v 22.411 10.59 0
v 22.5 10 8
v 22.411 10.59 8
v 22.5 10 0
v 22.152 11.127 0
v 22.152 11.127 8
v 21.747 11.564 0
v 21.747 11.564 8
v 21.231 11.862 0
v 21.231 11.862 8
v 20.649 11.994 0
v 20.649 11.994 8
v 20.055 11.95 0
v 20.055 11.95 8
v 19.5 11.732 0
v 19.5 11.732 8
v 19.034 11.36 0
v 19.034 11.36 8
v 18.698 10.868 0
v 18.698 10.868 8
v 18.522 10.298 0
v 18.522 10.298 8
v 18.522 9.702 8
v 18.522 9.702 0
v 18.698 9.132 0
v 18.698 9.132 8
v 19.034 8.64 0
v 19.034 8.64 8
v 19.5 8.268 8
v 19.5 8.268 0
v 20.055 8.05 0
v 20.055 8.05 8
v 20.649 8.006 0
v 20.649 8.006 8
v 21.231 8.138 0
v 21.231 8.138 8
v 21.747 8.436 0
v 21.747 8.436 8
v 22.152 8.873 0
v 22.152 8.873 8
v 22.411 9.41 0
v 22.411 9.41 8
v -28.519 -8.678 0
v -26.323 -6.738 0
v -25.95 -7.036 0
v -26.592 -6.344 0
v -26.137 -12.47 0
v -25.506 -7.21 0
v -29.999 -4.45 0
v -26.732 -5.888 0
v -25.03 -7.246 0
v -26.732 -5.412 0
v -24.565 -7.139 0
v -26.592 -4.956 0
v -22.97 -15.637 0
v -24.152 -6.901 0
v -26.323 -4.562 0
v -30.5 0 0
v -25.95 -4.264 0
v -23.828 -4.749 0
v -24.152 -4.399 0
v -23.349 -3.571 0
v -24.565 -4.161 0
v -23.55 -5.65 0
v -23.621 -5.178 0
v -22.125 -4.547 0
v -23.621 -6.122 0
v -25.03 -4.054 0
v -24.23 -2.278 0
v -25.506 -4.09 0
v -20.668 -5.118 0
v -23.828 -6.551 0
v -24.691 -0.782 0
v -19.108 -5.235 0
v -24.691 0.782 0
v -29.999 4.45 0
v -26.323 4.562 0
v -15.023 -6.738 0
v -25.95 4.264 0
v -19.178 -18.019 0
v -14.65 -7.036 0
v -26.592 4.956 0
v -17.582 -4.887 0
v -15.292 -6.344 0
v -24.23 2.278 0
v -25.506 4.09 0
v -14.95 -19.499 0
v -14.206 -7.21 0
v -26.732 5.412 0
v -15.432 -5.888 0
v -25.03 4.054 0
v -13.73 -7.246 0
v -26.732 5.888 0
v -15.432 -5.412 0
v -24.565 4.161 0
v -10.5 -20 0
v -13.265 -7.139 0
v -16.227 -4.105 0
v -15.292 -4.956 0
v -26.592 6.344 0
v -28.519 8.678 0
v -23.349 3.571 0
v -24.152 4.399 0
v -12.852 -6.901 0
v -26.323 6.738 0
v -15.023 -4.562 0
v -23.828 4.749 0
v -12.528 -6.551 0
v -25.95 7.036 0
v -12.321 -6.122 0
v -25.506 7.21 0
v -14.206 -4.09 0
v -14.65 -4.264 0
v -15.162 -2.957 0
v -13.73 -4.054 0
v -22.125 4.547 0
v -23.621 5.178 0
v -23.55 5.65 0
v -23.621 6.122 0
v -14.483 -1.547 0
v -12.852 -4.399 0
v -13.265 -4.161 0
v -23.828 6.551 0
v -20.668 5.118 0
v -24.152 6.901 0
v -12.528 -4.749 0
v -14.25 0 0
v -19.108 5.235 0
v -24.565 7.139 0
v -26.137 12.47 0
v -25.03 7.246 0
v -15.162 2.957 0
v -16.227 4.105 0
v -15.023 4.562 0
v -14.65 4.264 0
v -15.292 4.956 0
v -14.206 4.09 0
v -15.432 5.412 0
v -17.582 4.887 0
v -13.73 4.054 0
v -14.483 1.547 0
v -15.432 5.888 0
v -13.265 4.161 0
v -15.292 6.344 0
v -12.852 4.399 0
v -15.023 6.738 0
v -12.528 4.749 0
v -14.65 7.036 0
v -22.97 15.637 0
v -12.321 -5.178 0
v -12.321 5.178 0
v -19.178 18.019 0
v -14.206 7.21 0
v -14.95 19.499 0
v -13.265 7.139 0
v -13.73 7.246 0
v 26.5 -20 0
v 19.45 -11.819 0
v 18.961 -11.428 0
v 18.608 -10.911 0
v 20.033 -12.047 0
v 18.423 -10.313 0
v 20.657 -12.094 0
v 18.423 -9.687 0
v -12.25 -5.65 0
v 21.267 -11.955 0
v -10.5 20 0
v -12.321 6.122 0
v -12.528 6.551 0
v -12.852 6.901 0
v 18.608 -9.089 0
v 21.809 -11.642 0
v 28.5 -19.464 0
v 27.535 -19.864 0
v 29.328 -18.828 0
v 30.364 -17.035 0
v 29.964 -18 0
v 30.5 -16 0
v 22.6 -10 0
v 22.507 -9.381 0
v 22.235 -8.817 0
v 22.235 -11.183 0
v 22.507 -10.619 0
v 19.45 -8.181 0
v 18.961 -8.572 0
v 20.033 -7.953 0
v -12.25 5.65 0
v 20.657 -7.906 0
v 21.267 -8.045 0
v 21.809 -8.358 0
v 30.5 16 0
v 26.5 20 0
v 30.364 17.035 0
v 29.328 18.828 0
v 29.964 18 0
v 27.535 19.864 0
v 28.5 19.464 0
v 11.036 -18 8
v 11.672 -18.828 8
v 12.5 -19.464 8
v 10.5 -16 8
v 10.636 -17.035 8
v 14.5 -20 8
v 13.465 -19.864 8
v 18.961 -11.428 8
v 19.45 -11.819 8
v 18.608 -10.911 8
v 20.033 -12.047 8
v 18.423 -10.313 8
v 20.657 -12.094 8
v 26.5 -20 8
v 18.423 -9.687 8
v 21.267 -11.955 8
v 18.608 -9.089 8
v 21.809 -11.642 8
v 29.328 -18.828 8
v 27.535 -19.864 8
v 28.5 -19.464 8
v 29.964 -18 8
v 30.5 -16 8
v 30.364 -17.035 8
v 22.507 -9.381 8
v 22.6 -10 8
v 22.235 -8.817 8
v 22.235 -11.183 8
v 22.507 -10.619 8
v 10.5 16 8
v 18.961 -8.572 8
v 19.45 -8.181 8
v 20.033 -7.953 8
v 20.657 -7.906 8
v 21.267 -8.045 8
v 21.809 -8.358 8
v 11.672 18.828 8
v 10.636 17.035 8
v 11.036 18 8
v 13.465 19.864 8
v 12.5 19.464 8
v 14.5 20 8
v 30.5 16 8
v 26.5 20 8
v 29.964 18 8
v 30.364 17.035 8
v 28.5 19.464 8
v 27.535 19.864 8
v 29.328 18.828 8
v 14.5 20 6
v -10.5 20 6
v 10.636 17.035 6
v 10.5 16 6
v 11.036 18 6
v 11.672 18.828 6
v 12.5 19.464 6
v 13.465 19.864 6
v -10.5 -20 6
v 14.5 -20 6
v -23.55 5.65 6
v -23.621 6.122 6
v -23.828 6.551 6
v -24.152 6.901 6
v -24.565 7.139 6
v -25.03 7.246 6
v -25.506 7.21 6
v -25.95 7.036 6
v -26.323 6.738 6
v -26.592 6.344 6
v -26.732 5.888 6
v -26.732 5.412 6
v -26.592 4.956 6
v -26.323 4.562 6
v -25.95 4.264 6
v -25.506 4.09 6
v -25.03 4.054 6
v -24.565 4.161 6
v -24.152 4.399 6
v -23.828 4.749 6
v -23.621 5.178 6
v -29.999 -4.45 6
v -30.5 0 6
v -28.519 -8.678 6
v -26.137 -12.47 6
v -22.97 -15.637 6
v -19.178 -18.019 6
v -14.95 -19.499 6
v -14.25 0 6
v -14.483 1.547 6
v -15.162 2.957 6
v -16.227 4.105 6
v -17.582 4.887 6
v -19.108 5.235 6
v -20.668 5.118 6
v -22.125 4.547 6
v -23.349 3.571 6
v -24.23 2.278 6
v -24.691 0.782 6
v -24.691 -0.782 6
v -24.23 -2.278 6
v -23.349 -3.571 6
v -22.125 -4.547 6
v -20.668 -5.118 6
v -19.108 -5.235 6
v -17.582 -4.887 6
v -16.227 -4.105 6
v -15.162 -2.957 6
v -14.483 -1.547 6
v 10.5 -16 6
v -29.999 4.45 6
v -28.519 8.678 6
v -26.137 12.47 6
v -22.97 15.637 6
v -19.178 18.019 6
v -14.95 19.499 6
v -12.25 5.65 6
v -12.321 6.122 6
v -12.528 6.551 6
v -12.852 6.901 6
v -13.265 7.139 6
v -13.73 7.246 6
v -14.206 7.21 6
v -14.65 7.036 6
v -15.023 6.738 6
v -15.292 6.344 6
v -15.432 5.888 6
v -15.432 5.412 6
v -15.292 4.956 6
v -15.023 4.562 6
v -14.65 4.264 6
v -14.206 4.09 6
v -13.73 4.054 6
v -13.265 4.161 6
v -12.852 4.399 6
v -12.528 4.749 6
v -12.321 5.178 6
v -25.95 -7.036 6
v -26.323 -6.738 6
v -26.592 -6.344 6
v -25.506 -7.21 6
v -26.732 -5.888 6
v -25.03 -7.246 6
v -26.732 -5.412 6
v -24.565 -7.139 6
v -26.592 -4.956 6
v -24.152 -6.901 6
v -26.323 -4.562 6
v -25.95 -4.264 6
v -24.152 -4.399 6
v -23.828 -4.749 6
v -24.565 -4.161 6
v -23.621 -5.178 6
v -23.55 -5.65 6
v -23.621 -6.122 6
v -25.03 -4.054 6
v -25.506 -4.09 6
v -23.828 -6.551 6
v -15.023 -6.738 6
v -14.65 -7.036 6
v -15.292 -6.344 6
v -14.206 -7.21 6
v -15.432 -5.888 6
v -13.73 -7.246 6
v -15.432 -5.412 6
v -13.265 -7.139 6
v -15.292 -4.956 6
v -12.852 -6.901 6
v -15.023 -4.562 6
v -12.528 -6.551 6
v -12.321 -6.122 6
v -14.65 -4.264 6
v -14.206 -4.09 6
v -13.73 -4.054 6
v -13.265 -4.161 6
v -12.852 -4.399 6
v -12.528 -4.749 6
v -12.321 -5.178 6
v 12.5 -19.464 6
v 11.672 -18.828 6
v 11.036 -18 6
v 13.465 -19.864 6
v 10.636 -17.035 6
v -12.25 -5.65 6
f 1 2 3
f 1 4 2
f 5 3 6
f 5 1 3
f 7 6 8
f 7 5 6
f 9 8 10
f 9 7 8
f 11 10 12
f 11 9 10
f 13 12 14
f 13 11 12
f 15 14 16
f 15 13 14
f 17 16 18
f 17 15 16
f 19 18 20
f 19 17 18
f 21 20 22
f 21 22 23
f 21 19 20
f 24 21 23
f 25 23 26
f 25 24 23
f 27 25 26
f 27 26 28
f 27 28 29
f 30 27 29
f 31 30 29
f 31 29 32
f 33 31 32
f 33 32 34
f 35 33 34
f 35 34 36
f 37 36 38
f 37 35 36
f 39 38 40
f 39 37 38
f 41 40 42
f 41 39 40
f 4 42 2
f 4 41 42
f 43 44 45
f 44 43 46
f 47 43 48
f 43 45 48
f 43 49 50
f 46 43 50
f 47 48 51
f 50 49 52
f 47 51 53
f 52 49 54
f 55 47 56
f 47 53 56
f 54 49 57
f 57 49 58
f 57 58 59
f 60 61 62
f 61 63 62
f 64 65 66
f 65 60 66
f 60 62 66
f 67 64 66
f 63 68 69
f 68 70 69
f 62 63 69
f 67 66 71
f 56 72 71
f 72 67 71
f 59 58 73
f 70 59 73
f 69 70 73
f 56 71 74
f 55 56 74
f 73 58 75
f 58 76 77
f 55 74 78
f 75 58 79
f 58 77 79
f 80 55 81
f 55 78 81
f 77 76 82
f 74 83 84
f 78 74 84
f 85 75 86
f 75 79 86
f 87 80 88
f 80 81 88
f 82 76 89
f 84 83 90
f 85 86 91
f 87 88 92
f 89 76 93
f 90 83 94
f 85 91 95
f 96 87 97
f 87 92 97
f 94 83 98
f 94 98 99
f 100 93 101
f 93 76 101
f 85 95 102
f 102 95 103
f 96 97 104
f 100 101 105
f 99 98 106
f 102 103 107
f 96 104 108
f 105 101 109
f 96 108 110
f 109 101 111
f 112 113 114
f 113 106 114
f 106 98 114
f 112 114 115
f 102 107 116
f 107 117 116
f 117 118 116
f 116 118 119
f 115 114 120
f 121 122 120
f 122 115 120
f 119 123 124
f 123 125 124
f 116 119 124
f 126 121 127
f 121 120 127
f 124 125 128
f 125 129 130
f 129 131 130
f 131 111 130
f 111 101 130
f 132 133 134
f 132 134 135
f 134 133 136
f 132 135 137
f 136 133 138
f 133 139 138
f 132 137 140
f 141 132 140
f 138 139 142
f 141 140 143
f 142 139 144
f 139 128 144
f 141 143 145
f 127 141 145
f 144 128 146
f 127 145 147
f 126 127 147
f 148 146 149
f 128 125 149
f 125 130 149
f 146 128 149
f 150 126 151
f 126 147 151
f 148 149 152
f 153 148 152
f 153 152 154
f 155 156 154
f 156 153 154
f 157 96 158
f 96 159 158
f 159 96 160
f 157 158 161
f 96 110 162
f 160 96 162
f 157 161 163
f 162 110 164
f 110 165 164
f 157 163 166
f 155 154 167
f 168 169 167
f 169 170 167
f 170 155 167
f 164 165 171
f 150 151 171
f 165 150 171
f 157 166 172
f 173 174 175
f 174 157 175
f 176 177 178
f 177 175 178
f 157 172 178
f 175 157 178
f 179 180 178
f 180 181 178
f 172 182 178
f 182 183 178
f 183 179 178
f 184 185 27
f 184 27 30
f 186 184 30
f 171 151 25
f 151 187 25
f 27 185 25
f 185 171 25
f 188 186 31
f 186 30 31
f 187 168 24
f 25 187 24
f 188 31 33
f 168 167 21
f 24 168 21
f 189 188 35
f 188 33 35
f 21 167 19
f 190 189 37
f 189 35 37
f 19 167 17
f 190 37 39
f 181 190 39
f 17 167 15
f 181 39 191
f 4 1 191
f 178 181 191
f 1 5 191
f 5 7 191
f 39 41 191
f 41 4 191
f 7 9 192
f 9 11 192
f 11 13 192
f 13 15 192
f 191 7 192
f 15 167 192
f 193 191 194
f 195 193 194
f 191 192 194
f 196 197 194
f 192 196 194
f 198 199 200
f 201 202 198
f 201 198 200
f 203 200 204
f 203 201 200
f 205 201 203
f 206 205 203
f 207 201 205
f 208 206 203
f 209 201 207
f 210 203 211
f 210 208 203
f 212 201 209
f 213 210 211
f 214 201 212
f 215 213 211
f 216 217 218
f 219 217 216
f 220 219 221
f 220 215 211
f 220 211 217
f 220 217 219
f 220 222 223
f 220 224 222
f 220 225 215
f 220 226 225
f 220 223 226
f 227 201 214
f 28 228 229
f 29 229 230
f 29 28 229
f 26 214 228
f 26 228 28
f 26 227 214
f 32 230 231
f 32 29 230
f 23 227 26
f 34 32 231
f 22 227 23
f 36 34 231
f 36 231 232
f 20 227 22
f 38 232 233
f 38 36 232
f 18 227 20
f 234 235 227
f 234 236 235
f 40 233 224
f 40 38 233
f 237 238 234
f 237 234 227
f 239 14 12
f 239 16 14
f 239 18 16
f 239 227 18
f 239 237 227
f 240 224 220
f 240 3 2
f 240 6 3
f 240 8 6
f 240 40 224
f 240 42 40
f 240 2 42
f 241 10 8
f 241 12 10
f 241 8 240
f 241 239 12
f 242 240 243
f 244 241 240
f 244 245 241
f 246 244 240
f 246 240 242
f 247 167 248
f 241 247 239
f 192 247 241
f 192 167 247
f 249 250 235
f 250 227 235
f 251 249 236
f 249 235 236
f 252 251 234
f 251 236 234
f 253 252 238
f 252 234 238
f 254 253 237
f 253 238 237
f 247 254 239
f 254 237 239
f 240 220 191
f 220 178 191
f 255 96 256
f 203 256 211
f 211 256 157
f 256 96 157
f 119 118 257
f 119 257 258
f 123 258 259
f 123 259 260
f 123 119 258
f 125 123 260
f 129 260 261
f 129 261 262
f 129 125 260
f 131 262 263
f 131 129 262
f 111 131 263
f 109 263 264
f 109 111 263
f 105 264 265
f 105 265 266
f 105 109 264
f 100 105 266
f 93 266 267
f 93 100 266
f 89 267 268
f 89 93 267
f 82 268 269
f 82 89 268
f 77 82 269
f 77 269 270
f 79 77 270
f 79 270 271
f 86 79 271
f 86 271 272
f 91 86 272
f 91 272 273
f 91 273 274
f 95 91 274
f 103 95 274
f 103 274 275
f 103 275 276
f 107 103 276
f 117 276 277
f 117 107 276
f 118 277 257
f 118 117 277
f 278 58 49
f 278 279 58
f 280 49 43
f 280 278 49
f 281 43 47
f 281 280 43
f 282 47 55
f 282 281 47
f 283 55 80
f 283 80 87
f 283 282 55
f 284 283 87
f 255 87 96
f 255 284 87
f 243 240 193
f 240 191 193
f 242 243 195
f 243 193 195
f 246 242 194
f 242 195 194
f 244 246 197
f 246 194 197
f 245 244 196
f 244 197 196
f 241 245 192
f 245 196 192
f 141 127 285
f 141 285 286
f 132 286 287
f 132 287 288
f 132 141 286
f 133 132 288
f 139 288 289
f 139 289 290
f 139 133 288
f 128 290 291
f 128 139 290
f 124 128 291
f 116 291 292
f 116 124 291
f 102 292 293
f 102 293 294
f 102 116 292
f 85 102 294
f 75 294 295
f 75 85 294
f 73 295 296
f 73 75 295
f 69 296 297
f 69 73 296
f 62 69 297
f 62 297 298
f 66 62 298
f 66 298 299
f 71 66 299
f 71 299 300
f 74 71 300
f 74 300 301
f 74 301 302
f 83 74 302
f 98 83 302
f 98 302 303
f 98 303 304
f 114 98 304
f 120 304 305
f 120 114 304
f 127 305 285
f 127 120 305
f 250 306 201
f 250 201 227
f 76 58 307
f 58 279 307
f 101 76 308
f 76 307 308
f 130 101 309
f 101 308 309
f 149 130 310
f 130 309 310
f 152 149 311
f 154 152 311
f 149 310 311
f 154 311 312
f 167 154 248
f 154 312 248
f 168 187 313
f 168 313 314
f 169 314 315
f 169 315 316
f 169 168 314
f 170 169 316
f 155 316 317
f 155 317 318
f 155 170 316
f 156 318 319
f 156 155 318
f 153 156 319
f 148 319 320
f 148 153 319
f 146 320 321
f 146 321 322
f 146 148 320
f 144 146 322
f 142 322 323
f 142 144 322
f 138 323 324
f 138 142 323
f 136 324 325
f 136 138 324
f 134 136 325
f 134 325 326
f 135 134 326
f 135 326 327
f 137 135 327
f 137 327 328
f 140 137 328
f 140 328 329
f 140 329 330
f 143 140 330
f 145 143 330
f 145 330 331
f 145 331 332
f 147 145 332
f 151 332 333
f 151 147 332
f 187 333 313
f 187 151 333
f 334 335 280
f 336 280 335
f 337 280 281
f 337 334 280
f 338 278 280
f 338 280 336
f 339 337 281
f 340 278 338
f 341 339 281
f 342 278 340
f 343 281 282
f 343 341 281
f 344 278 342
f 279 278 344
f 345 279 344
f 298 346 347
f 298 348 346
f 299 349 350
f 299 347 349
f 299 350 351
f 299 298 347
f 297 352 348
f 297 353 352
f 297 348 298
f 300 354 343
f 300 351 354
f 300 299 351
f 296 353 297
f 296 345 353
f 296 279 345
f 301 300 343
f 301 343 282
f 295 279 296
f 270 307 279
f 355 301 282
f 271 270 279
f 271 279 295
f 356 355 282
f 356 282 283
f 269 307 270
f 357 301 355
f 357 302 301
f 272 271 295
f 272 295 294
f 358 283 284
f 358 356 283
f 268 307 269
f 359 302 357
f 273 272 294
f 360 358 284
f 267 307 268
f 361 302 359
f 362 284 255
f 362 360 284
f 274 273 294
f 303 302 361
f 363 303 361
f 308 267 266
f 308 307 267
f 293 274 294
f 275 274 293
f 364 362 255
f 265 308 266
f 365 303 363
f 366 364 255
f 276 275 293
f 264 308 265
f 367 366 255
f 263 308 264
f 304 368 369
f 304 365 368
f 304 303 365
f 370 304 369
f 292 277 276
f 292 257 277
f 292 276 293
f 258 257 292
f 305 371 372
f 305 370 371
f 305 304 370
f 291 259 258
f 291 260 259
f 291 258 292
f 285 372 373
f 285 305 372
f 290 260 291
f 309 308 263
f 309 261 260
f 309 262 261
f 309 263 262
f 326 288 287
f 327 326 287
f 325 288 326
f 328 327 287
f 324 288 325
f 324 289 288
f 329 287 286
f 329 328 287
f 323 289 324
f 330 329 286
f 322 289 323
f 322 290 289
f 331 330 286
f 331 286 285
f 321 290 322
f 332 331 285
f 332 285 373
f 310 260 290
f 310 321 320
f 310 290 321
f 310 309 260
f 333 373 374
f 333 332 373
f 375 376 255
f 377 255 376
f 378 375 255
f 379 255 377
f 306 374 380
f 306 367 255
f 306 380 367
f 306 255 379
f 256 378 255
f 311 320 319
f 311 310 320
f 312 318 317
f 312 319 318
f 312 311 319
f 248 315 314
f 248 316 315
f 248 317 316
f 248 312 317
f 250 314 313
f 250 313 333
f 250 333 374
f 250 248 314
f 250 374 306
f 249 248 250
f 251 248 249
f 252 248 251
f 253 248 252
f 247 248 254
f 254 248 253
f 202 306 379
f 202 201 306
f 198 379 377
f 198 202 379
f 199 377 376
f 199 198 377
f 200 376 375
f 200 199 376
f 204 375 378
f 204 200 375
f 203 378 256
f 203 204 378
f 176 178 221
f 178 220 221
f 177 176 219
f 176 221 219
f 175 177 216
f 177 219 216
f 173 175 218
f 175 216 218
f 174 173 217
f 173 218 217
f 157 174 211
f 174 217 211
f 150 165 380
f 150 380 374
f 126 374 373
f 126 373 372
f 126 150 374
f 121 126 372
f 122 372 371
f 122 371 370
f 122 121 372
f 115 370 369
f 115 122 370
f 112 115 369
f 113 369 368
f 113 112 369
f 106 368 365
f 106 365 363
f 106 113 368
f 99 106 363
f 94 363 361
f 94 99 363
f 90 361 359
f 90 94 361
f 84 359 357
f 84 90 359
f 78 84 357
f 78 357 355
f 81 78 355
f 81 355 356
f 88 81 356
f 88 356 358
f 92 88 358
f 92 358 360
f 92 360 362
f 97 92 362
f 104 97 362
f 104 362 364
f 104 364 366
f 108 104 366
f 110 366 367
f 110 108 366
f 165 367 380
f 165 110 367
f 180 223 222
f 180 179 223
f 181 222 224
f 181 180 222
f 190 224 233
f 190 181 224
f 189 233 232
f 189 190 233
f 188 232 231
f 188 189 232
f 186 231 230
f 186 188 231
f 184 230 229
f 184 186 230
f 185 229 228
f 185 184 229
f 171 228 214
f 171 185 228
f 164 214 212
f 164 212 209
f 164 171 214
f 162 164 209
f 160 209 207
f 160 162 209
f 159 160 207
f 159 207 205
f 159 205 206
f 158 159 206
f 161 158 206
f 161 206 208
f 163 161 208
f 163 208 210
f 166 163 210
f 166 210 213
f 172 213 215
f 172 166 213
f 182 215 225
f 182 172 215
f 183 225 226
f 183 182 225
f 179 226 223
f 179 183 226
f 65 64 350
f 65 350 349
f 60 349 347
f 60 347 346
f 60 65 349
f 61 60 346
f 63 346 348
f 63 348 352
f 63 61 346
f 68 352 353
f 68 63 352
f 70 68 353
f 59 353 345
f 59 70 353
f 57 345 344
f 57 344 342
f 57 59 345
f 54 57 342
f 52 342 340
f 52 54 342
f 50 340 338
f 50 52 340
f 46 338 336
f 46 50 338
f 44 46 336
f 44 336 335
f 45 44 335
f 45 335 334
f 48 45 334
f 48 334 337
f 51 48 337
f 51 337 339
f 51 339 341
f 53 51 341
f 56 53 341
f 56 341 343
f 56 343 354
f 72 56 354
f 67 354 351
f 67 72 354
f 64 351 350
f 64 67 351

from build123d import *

# Parameters (mm, degrees)
F0_W     = 61
F0_H     = 40
F0_R     = 1.6
F0_R_2   = 2.1
F0_R_3   = 5.25
F0_R_4   = 2
F1_DEPTH = 6
F2_DEPTH = 77
F3_R     = 19.99999
F4_W     = 20
F4_H     = 40
F4_R     = 2.1
F4_R_2   = 2
F5_DEPTH = 2
F6_R     = 4


# Not quite as in the source:
# - a fillet or chamfer is up to 0.001 mm smaller than in the source, because OpenCascade refuses the exact size
# - an extrude ends at something that could not be found from the text; its depth is read off the source's solid


with BuildPart() as f1:
    # F0 (on Top) → F1 (new body)
    with BuildSketch(Plane.XY):
        Rectangle(F0_W, F0_H)
        with Locations((-25.15, -5.65)):
            Circle(F0_R, mode=Mode.SUBTRACT)
        with Locations((-13.85, -5.65)):
            Circle(F0_R, mode=Mode.SUBTRACT)
        with Locations((20.5, -10)):
            Circle(F0_R_2, mode=Mode.SUBTRACT)
        with Locations((-19.5, 0)):
            Circle(F0_R_3, mode=Mode.SUBTRACT)
        with Locations((-25.15, 5.65)):
            Circle(F0_R, mode=Mode.SUBTRACT)
        with Locations((-13.85, 5.65)):
            Circle(F0_R, mode=Mode.SUBTRACT)
        with Locations((20.5, 10)):
            Circle(F0_R_4, mode=Mode.SUBTRACT)
    extrude(amount=F1_DEPTH)

    # F0 (on Top) → F2 (cut, through all)
    with BuildSketch(Plane.XY):
        Rectangle(F0_W, F0_H)
        with Locations((-25.15, -5.65)):
            Circle(F0_R, mode=Mode.SUBTRACT)
        with Locations((-13.85, -5.65)):
            Circle(F0_R, mode=Mode.SUBTRACT)
        with Locations((20.5, -10)):
            Circle(F0_R_2, mode=Mode.SUBTRACT)
        with Locations((-19.5, 0)):
            Circle(F0_R_3, mode=Mode.SUBTRACT)
        with Locations((-25.15, 5.65)):
            Circle(F0_R, mode=Mode.SUBTRACT)
        with Locations((-13.85, 5.65)):
            Circle(F0_R, mode=Mode.SUBTRACT)
        with Locations((20.5, 10)):
            Circle(F0_R_4, mode=Mode.SUBTRACT)
    extrude(amount=-F2_DEPTH, mode=Mode.SUBTRACT)

    # F3 (radius 20 in the source; OpenCascade refuses exactly that, so slightly less here)
    f3_edges = [f1.edges().sort_by_distance(p)[0] for p in [
        (-30.5, -20, 3),
        (-30.5, 20, 3),
    ]]
    fillet(f3_edges, radius=F3_R)

    # F4 (on face) → F5 (join)
    with BuildSketch(Plane.XY.offset(6)):
        with Locations((20.5, 0)):
            Rectangle(F4_W, F4_H)
        with Locations((20.5, -10)):
            Circle(F4_R, mode=Mode.SUBTRACT)
        with Locations((20.5, 10)):
            Circle(F4_R_2, mode=Mode.SUBTRACT)
    extrude(amount=F5_DEPTH)

    # F6
    f6_edges = [f1.edges().sort_by_distance(p)[0] for p in [
        (10.5, -20, 7),
        (30.5, -20, 4),
        (10.5, 20, 7),
        (30.5, 20, 4),
    ]]
    fillet(f6_edges, radius=F6_R)


solid = f1.part
